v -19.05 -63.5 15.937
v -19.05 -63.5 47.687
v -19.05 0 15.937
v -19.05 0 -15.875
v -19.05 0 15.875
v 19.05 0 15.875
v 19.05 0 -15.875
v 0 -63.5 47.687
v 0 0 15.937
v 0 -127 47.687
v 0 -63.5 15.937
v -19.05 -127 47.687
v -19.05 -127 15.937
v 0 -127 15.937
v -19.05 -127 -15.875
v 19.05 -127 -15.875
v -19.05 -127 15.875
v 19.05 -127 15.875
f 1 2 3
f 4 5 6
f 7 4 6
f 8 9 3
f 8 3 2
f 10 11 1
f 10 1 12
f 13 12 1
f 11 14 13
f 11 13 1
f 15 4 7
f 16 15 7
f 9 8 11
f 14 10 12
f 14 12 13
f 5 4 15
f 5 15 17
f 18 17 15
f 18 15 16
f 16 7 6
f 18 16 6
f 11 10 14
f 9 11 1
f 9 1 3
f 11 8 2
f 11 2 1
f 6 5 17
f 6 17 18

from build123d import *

# Parameters (mm, degrees)
F0_W     = 38.1
F0_H     = 31.75
F1_DEPTH = 127
F3_DEPTH = 19.05


with BuildPart() as f1:
    # F0 (on Front) → F1 (new body)
    with BuildSketch(Plane.XZ):
        Rectangle(F0_W, F0_H)
    extrude(amount=F1_DEPTH)


with BuildPart() as f3:
    # F2 (on Right) → F3 (new body)
    with BuildSketch(Plane.YZ):
        Polygon((-63.5, 15.93653), (0, 15.93653), (-63.5, 47.68653), align=None)
        Polygon((-127, 15.93653), (-63.5, 15.93653), (-127, 47.68653), align=None)
    extrude(amount=-F3_DEPTH)


solid = Compound([f1.part, f3.part])
